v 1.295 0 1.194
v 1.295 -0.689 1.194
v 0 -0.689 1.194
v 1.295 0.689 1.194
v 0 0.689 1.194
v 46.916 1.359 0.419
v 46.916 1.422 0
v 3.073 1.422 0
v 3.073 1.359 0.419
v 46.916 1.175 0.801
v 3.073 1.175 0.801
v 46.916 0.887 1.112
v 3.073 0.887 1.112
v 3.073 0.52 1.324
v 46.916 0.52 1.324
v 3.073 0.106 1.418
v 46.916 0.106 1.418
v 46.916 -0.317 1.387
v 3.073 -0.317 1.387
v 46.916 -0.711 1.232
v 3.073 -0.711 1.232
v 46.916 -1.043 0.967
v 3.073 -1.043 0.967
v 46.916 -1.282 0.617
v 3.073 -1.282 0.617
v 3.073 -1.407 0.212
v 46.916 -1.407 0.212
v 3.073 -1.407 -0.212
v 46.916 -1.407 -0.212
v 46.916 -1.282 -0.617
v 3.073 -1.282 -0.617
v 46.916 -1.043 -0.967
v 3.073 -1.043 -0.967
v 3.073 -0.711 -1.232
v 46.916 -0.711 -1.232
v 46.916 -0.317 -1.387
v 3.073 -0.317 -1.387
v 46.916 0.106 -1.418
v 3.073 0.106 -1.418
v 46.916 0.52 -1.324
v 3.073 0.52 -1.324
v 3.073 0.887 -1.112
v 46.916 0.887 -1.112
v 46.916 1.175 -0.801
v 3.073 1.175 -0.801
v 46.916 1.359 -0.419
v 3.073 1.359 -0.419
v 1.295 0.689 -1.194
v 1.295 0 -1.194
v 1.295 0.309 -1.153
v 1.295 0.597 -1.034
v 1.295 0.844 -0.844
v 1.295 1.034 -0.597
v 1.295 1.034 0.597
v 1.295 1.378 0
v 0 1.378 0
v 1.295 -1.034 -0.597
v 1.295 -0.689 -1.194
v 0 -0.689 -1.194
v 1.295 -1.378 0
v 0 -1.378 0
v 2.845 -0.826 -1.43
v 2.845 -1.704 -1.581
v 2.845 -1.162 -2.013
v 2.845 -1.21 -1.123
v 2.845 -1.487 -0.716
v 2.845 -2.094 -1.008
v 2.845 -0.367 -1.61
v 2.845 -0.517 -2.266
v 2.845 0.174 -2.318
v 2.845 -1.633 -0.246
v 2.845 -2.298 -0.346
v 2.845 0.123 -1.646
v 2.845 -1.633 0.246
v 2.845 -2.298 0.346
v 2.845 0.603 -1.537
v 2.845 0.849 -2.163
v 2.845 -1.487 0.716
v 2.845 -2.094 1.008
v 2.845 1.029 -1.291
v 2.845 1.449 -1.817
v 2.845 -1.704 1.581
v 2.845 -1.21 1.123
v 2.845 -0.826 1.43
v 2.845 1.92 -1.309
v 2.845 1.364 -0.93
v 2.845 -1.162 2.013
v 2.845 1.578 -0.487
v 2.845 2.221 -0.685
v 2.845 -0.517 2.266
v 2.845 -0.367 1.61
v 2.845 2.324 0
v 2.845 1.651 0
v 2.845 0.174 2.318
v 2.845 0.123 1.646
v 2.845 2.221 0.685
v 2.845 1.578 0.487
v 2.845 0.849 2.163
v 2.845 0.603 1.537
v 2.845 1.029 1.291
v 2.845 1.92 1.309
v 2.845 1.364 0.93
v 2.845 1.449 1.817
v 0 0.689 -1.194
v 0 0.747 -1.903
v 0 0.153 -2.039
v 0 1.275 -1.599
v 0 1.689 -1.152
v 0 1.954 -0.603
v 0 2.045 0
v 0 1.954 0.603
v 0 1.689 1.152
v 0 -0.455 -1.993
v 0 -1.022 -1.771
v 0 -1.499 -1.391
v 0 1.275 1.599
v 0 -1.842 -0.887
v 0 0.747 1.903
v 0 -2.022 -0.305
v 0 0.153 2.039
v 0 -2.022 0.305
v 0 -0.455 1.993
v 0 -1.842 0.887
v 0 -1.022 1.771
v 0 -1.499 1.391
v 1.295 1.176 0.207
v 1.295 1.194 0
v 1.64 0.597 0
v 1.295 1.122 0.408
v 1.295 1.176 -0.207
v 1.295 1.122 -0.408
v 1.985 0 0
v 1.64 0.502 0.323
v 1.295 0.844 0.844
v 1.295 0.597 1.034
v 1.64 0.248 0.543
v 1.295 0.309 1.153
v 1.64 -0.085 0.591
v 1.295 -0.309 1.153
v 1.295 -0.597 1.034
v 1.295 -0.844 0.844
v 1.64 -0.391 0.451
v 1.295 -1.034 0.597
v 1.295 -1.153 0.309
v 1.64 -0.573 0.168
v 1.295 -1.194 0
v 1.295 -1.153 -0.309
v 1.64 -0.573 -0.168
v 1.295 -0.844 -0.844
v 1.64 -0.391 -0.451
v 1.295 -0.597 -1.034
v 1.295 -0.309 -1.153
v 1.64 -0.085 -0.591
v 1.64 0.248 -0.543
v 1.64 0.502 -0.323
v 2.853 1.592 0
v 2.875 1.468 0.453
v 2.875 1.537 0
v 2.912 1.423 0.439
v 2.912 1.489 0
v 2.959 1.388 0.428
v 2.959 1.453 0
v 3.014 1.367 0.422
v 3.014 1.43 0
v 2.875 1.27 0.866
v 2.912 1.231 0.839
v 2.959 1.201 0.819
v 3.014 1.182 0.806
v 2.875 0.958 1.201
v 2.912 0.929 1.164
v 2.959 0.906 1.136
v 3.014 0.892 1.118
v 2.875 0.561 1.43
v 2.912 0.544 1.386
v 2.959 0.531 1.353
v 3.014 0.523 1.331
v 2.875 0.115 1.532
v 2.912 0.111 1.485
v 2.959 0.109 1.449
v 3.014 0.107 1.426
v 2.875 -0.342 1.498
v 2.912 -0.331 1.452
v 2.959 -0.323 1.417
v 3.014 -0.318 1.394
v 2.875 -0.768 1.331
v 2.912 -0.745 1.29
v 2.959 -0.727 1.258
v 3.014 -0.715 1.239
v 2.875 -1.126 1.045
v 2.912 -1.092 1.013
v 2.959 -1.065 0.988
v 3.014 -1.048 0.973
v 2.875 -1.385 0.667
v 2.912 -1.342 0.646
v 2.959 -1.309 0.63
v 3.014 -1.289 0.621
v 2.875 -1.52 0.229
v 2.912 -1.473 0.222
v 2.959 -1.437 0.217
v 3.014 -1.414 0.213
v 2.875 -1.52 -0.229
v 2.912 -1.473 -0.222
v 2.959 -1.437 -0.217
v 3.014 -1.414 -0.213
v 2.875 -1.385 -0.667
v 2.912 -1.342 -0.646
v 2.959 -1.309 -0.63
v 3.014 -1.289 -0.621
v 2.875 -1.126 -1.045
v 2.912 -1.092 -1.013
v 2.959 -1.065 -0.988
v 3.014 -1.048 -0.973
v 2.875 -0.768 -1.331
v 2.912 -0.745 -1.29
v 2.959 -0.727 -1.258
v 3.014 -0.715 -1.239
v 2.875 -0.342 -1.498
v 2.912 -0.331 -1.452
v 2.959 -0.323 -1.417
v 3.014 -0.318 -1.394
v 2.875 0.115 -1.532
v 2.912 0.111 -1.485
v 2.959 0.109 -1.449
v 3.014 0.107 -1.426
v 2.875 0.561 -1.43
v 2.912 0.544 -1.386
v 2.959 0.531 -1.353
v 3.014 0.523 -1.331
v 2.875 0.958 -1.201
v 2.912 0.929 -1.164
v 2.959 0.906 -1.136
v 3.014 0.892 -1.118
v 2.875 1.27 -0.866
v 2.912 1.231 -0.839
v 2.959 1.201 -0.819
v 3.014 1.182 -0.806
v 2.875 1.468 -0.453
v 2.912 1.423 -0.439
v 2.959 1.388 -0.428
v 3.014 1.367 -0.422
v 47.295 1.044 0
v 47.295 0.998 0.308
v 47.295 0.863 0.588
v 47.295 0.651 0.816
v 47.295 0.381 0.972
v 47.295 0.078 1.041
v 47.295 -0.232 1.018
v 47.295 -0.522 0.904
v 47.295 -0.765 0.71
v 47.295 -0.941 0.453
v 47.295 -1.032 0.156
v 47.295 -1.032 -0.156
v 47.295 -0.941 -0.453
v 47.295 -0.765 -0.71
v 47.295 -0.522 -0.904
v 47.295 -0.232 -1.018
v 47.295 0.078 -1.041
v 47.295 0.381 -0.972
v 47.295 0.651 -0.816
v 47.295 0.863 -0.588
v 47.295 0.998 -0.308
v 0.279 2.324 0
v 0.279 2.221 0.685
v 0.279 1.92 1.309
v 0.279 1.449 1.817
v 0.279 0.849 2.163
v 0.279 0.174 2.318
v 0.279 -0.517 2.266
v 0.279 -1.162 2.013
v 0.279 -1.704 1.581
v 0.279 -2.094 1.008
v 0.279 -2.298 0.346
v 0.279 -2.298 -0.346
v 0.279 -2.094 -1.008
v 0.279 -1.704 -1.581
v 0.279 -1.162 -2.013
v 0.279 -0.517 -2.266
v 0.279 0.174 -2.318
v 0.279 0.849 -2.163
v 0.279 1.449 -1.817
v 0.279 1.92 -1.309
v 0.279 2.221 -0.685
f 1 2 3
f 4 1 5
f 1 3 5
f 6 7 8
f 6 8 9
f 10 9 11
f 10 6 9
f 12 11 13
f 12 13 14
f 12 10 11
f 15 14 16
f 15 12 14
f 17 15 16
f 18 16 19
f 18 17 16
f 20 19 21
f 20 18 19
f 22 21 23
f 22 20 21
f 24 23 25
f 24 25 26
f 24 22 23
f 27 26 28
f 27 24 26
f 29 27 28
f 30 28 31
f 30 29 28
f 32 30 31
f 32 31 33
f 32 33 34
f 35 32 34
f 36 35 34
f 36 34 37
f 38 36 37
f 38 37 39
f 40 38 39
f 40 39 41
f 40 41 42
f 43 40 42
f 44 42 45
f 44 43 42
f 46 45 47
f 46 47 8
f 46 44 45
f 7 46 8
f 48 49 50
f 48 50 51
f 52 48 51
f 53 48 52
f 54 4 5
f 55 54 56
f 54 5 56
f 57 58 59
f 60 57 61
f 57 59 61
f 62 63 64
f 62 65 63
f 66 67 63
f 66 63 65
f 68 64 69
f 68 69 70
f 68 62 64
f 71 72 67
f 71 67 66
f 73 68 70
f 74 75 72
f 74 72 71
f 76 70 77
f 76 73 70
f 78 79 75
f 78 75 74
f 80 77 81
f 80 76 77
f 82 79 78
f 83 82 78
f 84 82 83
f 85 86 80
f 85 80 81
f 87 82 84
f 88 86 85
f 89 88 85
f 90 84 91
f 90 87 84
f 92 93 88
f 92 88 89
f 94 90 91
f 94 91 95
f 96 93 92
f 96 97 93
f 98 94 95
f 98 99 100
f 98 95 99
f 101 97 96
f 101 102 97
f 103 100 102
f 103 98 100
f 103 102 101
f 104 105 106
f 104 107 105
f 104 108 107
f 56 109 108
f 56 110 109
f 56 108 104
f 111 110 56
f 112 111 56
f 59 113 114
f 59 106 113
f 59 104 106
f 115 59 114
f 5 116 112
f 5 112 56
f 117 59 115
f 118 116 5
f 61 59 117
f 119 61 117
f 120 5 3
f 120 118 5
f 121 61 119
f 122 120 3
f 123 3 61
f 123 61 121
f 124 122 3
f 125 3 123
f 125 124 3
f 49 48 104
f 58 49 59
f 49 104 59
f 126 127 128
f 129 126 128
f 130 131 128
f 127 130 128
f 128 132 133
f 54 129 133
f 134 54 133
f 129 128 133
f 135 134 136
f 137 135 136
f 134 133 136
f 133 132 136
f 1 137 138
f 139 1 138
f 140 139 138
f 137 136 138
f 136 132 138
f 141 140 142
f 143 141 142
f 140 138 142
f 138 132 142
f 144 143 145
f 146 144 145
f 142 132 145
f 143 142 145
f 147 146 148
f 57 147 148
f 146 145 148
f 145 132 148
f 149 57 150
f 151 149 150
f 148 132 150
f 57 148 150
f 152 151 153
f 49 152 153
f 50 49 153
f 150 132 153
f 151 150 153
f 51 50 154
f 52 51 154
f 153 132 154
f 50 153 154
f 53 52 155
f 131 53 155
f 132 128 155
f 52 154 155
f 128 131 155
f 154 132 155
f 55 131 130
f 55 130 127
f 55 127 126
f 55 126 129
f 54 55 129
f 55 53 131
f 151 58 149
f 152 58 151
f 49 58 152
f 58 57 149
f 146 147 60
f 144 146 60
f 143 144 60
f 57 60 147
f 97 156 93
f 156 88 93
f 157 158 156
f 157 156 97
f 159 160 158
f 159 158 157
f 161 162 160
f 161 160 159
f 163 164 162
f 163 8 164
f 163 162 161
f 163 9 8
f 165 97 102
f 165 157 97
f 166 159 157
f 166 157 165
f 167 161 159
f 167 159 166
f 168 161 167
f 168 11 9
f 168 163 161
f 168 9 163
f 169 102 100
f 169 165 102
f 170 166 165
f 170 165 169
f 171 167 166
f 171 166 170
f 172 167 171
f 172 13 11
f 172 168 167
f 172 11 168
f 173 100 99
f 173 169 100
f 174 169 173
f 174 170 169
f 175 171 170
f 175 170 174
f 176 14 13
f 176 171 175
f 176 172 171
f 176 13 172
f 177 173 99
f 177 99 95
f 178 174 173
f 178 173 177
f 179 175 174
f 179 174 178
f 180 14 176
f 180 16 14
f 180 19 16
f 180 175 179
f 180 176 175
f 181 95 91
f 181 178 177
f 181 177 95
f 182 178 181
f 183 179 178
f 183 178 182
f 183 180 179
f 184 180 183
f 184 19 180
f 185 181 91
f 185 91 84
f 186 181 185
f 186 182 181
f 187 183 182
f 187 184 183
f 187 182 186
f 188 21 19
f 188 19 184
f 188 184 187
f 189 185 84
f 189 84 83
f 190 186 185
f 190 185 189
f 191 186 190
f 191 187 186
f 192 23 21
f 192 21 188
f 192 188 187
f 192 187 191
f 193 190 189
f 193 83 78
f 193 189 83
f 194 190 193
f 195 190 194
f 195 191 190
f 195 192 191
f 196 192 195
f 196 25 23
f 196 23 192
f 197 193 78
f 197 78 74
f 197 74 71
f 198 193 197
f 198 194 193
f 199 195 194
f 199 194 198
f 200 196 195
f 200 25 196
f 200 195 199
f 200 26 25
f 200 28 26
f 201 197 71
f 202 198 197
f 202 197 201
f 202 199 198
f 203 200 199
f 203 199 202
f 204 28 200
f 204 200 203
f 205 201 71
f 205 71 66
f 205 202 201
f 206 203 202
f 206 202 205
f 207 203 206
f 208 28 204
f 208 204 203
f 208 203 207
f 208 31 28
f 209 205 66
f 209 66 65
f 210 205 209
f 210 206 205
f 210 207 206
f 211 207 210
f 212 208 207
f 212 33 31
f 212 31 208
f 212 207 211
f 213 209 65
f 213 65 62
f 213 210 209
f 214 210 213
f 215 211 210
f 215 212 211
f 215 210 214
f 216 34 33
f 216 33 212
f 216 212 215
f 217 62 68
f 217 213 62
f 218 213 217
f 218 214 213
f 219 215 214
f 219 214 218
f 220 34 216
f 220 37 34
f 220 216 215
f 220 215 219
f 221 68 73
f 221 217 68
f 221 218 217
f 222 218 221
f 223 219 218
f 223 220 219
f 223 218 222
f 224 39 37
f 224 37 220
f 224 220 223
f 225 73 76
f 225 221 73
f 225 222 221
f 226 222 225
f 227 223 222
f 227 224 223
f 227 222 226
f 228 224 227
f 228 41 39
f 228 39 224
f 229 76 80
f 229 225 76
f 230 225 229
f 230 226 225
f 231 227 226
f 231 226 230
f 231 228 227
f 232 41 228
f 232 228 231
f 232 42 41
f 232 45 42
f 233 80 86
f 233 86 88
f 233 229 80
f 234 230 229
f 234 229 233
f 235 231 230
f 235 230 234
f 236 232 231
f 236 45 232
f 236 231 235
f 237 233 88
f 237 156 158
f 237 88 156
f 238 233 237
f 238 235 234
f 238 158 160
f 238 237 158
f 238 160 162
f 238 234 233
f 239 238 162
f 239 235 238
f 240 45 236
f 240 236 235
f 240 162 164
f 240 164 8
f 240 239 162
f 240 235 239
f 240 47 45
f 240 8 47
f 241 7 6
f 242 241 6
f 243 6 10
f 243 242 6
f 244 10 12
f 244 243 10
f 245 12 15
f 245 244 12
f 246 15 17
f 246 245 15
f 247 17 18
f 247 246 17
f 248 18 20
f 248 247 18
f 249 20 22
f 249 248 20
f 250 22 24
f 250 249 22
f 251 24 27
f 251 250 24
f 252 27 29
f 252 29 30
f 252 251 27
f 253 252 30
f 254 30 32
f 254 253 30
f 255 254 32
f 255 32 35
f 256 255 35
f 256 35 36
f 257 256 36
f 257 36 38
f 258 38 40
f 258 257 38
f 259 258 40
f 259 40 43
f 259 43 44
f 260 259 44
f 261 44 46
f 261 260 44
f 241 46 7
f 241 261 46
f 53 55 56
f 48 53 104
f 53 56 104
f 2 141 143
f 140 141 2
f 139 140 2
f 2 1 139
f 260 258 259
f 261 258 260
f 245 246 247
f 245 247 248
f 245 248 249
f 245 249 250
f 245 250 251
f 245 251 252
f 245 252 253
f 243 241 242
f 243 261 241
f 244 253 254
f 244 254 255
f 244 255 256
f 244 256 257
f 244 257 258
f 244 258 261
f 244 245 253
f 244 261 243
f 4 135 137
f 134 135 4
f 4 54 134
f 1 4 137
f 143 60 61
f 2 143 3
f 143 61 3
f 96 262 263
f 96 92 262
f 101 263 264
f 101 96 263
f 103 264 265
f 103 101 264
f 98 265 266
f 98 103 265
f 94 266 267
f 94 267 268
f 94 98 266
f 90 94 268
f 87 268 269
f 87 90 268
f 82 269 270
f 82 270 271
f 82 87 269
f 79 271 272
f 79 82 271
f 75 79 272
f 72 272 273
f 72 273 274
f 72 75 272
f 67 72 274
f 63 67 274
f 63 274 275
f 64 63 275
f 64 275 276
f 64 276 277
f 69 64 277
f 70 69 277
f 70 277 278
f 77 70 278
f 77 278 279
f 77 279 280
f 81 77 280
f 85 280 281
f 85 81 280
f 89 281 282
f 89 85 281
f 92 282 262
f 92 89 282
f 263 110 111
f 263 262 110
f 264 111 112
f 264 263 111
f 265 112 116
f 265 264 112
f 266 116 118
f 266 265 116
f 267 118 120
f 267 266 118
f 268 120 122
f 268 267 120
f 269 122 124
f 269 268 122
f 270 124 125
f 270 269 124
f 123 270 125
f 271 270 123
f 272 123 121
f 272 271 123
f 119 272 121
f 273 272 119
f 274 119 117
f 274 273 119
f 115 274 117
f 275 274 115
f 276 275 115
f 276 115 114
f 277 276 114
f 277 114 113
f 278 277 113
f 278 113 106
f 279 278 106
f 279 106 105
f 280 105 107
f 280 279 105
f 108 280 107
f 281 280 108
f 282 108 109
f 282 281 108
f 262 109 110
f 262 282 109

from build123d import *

# Parameters (mm, degrees)
FILLET1_R   = 0.2286
HEX_2_DEPTH = 1.2954


with BuildPart() as part:
    # BodySke → Base-Revolve (revolve)
    with BuildSketch(Plane.XY):
        Polygon((0, 0), (0, 2.0447), (0.2794, 2.3241), (2.8448, 2.3241), (2.8448, 1.4224), (46.91634, 1.4224), (47.2948, 1.04394), (47.2948, 0), align=None)
    revolve(axis=Axis((-31.75, 0, 0), (1, 0, 0)))

    # Fillet1
    fillet1_edges = [part.edges().sort_by_distance(p)[0] for p in [
        (2.8448, -1.4224, 0),
    ]]
    fillet(fillet1_edges, radius=FILLET1_R)

    # Sketch2 → Hex-PreBroach (revolve, cut)
    with BuildSketch(Plane.XY):
        Polygon((0, 1.1938), (1.2954, 1.1938), (1.984640751, 0), (0, 0), align=None)
    revolve(axis=Axis((0, 0, 0), (1, 0, 0)), mode=Mode.SUBTRACT)

    # Sketch3 → Hex 2 (cut)
    with BuildSketch(Plane(origin=(0, 0, 0), x_dir=(0, 0.5, 0.866025404), z_dir=(-1, 0, 0))):
        Polygon((0.689240751, 1.1938), (-0.689240751, 1.1938), (-1.378481503, 0), (-0.689240751, -1.1938), (0.689240751, -1.1938), (1.378481503, 0), align=None)
    extrude(amount=-HEX_2_DEPTH, mode=Mode.SUBTRACT)


solid = part.part
